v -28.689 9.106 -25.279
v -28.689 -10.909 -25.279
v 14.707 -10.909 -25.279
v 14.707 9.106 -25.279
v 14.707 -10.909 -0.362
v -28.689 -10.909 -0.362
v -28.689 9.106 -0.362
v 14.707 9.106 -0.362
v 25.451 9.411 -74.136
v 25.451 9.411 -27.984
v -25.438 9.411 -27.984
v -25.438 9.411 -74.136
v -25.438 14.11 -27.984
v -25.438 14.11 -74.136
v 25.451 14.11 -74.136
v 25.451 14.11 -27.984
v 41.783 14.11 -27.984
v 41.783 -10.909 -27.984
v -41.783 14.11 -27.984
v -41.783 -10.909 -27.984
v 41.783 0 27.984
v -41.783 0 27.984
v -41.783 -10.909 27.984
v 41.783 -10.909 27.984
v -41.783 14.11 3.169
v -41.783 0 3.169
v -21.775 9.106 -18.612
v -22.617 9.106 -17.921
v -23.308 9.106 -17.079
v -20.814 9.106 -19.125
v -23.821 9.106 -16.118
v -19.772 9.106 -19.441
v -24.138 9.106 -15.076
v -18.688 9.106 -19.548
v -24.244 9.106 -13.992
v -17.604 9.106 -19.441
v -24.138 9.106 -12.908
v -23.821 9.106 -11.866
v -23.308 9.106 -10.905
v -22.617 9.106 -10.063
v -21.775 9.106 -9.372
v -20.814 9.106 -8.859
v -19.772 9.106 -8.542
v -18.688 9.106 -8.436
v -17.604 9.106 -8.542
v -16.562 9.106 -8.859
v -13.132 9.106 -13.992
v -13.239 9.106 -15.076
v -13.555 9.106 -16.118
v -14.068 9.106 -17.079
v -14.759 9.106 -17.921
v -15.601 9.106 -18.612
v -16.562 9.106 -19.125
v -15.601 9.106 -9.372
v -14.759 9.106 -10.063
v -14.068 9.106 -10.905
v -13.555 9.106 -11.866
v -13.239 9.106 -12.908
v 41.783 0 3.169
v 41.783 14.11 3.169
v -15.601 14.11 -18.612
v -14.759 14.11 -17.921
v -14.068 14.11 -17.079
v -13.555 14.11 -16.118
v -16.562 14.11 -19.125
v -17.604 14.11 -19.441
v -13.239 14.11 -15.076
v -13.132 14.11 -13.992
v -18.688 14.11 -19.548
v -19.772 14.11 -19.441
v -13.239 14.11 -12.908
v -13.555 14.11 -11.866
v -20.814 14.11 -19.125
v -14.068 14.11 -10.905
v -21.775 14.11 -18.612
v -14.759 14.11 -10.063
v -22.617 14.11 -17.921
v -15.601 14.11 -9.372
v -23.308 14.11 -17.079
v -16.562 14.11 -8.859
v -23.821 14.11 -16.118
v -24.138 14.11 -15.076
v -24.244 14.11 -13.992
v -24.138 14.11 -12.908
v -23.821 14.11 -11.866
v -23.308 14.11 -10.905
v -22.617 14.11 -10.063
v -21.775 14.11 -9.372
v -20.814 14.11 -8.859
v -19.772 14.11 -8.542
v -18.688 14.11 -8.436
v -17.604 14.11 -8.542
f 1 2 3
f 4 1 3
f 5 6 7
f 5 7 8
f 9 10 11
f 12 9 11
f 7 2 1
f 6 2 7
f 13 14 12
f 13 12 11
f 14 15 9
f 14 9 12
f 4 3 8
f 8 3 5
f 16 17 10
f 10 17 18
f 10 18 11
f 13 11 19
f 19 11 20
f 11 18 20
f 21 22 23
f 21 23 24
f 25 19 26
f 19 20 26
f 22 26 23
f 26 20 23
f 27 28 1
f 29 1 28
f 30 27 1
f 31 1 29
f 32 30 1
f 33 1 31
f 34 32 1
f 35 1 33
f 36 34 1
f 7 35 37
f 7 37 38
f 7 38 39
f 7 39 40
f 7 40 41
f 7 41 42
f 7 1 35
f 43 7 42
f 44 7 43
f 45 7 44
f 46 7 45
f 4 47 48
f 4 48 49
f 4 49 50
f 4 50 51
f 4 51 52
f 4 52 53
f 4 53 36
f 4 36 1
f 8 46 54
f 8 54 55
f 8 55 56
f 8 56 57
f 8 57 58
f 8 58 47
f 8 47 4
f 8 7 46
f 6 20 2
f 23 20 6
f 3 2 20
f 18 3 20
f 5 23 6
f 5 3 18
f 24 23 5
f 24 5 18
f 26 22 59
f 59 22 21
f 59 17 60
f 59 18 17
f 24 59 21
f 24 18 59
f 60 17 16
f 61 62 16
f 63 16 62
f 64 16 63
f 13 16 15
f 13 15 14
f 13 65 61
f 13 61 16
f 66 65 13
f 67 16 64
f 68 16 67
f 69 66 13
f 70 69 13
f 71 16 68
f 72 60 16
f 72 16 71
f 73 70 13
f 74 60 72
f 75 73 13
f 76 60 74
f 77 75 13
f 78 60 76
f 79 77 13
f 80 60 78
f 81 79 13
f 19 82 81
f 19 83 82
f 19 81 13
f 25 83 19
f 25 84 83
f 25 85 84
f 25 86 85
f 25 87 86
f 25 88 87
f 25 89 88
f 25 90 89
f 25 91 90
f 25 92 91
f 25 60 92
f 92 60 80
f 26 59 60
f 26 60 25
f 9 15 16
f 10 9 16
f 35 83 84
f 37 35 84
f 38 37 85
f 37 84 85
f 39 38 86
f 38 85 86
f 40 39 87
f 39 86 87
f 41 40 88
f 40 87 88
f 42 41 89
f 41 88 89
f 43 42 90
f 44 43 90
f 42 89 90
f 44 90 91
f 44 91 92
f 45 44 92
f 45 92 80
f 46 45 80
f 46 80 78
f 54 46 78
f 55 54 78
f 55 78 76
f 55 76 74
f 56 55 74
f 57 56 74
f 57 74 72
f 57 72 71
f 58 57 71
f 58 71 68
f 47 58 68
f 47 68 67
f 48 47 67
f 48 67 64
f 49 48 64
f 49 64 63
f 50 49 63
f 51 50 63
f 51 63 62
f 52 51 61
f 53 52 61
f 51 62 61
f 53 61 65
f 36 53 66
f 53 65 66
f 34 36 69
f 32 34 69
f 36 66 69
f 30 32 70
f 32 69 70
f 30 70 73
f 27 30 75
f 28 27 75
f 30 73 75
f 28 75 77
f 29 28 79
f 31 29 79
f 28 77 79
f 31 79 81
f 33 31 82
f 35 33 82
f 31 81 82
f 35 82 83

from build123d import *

# Parameters (mm, degrees)
F0_W     = 83.566
F0_H     = 55.9689
F1_DEPTH = 10.9093
F2_W     = 83.566
F2_H     = 31.1531
F3_DEPTH = 14.1097
F4_W     = 50.8889
F4_H     = 46.1518
F5_DEPTH = 4.699
F6_W     = 43.3959
F6_H     = 24.9174
F7_DEPTH = 20.0152
F8_R     = 5.55625
F9_DEPTH = 25.4


with BuildPart() as f1:
    # F0 (on Front) → F1 (new body)
    with BuildSketch(Plane.XZ):
        Rectangle(F0_W, F0_H)
    extrude(amount=F1_DEPTH)

    # F2 (on face) → F3 (join)
    with BuildSketch(Plane(origin=(0, 0, 0), x_dir=(-1, 0, 0), z_dir=(0, 1, 0))):
        with Locations((0, -12.4079)):
            Rectangle(F2_W, F2_H)
    extrude(amount=F3_DEPTH)

    # F4 (on face) → F5 (join)
    with BuildSketch(Plane(origin=(0, 14.1097, 0), x_dir=(-1, 0, 0), z_dir=(0, 1, 0))):
        with Locations((-0.00635, -51.06035)):
            Rectangle(F4_W, F4_H)
    extrude(amount=-F5_DEPTH)

    # F6 (on face) → F7 (cut)
    with BuildSketch(Plane.XZ.offset(10.9093)):
        with Locations((-6.99135, -12.82065)):
            Rectangle(F6_W, F6_H)
    extrude(amount=-F7_DEPTH, mode=Mode.SUBTRACT)

    # F8 (on face) → F9 (cut)
    with BuildSketch(Plane(origin=(0, 14.1097, 0), x_dir=(-1, 0, 0), z_dir=(0, 1, 0))):
        with Locations((18.68805, -13.991897)):
            Circle(F8_R)
    extrude(amount=-F9_DEPTH, mode=Mode.SUBTRACT)


solid = f1.part
